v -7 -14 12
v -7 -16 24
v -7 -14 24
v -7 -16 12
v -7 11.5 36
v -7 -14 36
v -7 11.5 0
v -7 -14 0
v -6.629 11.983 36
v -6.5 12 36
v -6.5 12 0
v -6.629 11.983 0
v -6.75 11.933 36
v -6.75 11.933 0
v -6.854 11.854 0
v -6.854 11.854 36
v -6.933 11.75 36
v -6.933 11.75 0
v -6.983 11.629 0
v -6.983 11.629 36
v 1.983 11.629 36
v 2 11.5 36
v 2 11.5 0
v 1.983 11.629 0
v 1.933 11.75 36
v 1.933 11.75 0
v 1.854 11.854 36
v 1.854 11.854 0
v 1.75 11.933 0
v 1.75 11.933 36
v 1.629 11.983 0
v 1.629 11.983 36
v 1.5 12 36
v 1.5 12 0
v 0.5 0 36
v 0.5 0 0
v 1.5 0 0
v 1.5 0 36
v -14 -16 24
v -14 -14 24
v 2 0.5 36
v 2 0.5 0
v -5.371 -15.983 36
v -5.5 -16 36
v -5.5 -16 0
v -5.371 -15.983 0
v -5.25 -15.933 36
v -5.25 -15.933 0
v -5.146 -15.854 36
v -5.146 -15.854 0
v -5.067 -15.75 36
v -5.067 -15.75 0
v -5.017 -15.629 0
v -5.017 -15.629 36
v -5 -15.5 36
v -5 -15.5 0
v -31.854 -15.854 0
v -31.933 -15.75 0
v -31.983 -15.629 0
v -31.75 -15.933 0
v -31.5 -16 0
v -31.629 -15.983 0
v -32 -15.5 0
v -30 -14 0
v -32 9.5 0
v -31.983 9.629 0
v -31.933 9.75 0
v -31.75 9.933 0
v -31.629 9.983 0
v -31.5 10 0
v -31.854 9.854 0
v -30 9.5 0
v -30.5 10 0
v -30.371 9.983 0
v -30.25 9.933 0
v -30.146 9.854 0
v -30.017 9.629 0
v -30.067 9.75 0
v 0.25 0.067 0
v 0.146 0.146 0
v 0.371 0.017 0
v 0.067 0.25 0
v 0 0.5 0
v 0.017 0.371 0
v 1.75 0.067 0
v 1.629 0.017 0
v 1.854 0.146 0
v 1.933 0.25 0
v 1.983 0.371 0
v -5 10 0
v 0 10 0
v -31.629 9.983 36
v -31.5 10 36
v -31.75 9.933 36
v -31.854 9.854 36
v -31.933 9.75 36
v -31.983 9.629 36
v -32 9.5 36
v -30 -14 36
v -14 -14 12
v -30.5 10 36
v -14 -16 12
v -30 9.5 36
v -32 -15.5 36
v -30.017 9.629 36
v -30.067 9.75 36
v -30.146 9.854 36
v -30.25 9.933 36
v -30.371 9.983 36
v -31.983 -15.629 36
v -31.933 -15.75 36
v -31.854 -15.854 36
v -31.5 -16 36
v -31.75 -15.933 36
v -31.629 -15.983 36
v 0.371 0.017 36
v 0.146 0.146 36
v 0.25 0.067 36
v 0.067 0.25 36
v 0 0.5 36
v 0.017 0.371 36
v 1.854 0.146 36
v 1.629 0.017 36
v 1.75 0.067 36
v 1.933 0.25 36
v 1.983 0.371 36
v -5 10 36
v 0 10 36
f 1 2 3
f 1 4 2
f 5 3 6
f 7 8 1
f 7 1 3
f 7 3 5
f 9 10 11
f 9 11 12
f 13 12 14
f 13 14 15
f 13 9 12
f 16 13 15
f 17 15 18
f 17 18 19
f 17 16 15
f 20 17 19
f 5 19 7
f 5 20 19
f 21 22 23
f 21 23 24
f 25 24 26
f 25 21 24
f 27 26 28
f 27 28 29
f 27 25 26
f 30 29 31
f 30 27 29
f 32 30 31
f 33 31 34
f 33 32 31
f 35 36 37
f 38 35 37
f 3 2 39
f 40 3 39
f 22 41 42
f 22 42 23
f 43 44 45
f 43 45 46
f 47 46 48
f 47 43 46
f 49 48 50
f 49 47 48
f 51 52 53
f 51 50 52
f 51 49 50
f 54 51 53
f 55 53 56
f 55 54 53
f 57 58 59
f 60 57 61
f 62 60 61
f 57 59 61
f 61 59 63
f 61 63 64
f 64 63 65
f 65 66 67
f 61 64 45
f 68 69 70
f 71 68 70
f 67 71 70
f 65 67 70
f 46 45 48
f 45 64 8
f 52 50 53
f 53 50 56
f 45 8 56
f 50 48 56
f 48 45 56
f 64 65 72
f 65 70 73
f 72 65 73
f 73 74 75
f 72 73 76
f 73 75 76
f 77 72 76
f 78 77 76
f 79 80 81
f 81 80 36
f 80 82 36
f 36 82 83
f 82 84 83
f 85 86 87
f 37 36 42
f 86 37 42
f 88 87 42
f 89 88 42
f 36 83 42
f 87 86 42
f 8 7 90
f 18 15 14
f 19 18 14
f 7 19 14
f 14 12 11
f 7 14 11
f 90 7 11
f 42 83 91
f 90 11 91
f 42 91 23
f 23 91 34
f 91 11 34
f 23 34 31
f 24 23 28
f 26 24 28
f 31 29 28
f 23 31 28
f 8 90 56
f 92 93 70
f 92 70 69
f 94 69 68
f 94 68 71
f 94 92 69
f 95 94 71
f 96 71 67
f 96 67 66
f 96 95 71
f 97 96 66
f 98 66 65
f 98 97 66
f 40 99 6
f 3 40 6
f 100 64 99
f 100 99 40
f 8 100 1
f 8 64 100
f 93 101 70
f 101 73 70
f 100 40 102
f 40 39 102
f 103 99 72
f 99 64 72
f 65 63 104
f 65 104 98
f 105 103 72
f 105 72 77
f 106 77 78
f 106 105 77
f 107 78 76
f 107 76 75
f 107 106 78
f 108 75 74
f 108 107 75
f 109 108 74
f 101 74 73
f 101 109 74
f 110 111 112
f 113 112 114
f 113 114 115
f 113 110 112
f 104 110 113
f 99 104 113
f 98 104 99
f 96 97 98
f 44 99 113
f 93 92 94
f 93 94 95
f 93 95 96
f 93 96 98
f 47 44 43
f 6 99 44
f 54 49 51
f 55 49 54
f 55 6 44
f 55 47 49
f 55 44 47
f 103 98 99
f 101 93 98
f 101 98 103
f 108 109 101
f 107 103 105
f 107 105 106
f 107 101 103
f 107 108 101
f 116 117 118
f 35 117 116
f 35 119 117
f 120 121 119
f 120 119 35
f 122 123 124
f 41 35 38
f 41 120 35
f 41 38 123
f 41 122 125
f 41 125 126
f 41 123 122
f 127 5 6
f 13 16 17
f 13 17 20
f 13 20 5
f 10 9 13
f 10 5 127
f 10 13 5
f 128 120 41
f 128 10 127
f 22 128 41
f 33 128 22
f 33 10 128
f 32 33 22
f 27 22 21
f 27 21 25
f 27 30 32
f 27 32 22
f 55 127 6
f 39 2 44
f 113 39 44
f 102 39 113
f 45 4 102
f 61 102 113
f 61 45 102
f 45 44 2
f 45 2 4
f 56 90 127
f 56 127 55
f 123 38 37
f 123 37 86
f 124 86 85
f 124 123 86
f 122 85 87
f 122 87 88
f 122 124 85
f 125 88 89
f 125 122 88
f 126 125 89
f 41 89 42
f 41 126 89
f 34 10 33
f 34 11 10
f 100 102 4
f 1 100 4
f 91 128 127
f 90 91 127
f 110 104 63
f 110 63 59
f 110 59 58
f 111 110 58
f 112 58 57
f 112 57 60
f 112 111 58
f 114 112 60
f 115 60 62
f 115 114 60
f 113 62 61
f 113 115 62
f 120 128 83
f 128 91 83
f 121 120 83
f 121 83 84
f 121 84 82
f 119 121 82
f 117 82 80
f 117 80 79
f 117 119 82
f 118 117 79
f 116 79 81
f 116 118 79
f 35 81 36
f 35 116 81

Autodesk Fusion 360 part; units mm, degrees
sketch "Sketch2" plane through (0, 0, 0) normal (0, 0, 1) x (1, 0, 0)
  line L0 (0, 0) -> (2, 0)
  line L1 (2, 0) -> (2, 10)
  line L2 (2, 10) -> (0, 10)
  line L3 (0, 10) -> (0, 0)
  line L4 (0, 10) -> (2, 10)
  line L5 (2, 10) -> (2, 12)
  line L6 (2, 12) -> (0, 12)
  line L7 (0, 12) -> (0, 10)
  line L8 (0, 10) -> (-5, 10)
  line L9 (-5, 10) -> (-5, 12)
  line L10 (-5, 12) -> (0, 12)
  line L11 (0, 12) -> (0, 10)
  line L12 (-5, 10) -> (-7, 10)
  line L13 (-7, 10) -> (-7, 12)
  line L14 (-7, 12) -> (-5, 12)
  line L15 (-5, 12) -> (-5, 10)
  line L16 (-7, 10) -> (-5, 10)
  line L17 (-5, 10) -> (-5, -14)
  line L18 (-5, -14) -> (-7, -14)
  line L19 (-7, -14) -> (-7, 10)
  line L20 (-7, -14) -> (-5, -14)
  line L21 (-5, -14) -> (-5, -16)
  line L22 (-5, -16) -> (-7, -16)
  line L23 (-7, -16) -> (-7, -14)
  line L24 (-7, -16) -> (-30, -16)
  line L25 (-30, -16) -> (-30, -14)
  line L26 (-30, -14) -> (-7, -14)
  line L27 (-7, -14) -> (-7, -16)
  line L28 (-30, -16) -> (-32, -16)
  line L29 (-32, -16) -> (-32, -14)
  line L30 (-32, -14) -> (-30, -14)
  line L31 (-30, -14) -> (-30, -16)
  line L32 (-32, -14) -> (-30, -14)
  line L33 (-30, -14) -> (-30, 10)
  line L34 (-30, 10) -> (-32, 10)
  line L35 (-32, 10) -> (-32, -14)
  dimension "d3" = 2
  dimension "d4" = 10
  dimension "d5" = 2
  dimension "d6" = 2
  dimension "d7" = 5
  dimension "d8" = 2
  dimension "d9" = 2
  dimension "d10" = 2
  dimension "d11" = 24
  dimension "d12" = 2
  dimension "d13" = 23
  dimension "d14" = 2
  dimension "d15" = 2
  dimension "d16" = 2
  dimension "d17" = 2
  dimension "d18" = 24
extrude "Extrude1" add sketch "Sketch2" along normal blind 36
sketch "Sketch3" plane through (0, -16, 0) normal (0, -1, 0) x (1, 0, 0)
  line L0 (-32, 0) -> (-5, 0)
  line L1 (-5, 0) -> (-5, 36)
  line L2 (-5, 36) -> (-32, 36)
  line L3 (-32, 36) -> (-32, 0)
  line L4 (-5, 18) -> (-7, 18) construction
  line L5 (-7, 18) -> (-10.5, 18) construction
  line L6 (-14, 12) -> (-7, 12)
  line L7 (-7, 12) -> (-7, 24)
  line L8 (-7, 24) -> (-14, 24)
  line L9 (-14, 24) -> (-14, 12)
  line L10 (-14, 12) -> (-7, 24) construction
  line L11 (-7, 12) -> (-14, 24) construction
  point P0 (-7, 18)
  point P1 (-10.5, 18)
  dimension "d23" = 2
  dimension "d28" = 3.5
  dimension "d29" = 7
  dimension "d30" = 12
extrude "Extrude3" cut sketch "Sketch3" against normal blind 3 contours L6 L7 L8 L9
fillet "Fillet1" radius 0.5 8 edges at (0, 0, 18) (2, 0, 18) (-5, -16, 18) (-32, -16, 18) (2, 12, 18) (-7, 12, 18) (-30, 10, 18) (-32, 10, 18)
